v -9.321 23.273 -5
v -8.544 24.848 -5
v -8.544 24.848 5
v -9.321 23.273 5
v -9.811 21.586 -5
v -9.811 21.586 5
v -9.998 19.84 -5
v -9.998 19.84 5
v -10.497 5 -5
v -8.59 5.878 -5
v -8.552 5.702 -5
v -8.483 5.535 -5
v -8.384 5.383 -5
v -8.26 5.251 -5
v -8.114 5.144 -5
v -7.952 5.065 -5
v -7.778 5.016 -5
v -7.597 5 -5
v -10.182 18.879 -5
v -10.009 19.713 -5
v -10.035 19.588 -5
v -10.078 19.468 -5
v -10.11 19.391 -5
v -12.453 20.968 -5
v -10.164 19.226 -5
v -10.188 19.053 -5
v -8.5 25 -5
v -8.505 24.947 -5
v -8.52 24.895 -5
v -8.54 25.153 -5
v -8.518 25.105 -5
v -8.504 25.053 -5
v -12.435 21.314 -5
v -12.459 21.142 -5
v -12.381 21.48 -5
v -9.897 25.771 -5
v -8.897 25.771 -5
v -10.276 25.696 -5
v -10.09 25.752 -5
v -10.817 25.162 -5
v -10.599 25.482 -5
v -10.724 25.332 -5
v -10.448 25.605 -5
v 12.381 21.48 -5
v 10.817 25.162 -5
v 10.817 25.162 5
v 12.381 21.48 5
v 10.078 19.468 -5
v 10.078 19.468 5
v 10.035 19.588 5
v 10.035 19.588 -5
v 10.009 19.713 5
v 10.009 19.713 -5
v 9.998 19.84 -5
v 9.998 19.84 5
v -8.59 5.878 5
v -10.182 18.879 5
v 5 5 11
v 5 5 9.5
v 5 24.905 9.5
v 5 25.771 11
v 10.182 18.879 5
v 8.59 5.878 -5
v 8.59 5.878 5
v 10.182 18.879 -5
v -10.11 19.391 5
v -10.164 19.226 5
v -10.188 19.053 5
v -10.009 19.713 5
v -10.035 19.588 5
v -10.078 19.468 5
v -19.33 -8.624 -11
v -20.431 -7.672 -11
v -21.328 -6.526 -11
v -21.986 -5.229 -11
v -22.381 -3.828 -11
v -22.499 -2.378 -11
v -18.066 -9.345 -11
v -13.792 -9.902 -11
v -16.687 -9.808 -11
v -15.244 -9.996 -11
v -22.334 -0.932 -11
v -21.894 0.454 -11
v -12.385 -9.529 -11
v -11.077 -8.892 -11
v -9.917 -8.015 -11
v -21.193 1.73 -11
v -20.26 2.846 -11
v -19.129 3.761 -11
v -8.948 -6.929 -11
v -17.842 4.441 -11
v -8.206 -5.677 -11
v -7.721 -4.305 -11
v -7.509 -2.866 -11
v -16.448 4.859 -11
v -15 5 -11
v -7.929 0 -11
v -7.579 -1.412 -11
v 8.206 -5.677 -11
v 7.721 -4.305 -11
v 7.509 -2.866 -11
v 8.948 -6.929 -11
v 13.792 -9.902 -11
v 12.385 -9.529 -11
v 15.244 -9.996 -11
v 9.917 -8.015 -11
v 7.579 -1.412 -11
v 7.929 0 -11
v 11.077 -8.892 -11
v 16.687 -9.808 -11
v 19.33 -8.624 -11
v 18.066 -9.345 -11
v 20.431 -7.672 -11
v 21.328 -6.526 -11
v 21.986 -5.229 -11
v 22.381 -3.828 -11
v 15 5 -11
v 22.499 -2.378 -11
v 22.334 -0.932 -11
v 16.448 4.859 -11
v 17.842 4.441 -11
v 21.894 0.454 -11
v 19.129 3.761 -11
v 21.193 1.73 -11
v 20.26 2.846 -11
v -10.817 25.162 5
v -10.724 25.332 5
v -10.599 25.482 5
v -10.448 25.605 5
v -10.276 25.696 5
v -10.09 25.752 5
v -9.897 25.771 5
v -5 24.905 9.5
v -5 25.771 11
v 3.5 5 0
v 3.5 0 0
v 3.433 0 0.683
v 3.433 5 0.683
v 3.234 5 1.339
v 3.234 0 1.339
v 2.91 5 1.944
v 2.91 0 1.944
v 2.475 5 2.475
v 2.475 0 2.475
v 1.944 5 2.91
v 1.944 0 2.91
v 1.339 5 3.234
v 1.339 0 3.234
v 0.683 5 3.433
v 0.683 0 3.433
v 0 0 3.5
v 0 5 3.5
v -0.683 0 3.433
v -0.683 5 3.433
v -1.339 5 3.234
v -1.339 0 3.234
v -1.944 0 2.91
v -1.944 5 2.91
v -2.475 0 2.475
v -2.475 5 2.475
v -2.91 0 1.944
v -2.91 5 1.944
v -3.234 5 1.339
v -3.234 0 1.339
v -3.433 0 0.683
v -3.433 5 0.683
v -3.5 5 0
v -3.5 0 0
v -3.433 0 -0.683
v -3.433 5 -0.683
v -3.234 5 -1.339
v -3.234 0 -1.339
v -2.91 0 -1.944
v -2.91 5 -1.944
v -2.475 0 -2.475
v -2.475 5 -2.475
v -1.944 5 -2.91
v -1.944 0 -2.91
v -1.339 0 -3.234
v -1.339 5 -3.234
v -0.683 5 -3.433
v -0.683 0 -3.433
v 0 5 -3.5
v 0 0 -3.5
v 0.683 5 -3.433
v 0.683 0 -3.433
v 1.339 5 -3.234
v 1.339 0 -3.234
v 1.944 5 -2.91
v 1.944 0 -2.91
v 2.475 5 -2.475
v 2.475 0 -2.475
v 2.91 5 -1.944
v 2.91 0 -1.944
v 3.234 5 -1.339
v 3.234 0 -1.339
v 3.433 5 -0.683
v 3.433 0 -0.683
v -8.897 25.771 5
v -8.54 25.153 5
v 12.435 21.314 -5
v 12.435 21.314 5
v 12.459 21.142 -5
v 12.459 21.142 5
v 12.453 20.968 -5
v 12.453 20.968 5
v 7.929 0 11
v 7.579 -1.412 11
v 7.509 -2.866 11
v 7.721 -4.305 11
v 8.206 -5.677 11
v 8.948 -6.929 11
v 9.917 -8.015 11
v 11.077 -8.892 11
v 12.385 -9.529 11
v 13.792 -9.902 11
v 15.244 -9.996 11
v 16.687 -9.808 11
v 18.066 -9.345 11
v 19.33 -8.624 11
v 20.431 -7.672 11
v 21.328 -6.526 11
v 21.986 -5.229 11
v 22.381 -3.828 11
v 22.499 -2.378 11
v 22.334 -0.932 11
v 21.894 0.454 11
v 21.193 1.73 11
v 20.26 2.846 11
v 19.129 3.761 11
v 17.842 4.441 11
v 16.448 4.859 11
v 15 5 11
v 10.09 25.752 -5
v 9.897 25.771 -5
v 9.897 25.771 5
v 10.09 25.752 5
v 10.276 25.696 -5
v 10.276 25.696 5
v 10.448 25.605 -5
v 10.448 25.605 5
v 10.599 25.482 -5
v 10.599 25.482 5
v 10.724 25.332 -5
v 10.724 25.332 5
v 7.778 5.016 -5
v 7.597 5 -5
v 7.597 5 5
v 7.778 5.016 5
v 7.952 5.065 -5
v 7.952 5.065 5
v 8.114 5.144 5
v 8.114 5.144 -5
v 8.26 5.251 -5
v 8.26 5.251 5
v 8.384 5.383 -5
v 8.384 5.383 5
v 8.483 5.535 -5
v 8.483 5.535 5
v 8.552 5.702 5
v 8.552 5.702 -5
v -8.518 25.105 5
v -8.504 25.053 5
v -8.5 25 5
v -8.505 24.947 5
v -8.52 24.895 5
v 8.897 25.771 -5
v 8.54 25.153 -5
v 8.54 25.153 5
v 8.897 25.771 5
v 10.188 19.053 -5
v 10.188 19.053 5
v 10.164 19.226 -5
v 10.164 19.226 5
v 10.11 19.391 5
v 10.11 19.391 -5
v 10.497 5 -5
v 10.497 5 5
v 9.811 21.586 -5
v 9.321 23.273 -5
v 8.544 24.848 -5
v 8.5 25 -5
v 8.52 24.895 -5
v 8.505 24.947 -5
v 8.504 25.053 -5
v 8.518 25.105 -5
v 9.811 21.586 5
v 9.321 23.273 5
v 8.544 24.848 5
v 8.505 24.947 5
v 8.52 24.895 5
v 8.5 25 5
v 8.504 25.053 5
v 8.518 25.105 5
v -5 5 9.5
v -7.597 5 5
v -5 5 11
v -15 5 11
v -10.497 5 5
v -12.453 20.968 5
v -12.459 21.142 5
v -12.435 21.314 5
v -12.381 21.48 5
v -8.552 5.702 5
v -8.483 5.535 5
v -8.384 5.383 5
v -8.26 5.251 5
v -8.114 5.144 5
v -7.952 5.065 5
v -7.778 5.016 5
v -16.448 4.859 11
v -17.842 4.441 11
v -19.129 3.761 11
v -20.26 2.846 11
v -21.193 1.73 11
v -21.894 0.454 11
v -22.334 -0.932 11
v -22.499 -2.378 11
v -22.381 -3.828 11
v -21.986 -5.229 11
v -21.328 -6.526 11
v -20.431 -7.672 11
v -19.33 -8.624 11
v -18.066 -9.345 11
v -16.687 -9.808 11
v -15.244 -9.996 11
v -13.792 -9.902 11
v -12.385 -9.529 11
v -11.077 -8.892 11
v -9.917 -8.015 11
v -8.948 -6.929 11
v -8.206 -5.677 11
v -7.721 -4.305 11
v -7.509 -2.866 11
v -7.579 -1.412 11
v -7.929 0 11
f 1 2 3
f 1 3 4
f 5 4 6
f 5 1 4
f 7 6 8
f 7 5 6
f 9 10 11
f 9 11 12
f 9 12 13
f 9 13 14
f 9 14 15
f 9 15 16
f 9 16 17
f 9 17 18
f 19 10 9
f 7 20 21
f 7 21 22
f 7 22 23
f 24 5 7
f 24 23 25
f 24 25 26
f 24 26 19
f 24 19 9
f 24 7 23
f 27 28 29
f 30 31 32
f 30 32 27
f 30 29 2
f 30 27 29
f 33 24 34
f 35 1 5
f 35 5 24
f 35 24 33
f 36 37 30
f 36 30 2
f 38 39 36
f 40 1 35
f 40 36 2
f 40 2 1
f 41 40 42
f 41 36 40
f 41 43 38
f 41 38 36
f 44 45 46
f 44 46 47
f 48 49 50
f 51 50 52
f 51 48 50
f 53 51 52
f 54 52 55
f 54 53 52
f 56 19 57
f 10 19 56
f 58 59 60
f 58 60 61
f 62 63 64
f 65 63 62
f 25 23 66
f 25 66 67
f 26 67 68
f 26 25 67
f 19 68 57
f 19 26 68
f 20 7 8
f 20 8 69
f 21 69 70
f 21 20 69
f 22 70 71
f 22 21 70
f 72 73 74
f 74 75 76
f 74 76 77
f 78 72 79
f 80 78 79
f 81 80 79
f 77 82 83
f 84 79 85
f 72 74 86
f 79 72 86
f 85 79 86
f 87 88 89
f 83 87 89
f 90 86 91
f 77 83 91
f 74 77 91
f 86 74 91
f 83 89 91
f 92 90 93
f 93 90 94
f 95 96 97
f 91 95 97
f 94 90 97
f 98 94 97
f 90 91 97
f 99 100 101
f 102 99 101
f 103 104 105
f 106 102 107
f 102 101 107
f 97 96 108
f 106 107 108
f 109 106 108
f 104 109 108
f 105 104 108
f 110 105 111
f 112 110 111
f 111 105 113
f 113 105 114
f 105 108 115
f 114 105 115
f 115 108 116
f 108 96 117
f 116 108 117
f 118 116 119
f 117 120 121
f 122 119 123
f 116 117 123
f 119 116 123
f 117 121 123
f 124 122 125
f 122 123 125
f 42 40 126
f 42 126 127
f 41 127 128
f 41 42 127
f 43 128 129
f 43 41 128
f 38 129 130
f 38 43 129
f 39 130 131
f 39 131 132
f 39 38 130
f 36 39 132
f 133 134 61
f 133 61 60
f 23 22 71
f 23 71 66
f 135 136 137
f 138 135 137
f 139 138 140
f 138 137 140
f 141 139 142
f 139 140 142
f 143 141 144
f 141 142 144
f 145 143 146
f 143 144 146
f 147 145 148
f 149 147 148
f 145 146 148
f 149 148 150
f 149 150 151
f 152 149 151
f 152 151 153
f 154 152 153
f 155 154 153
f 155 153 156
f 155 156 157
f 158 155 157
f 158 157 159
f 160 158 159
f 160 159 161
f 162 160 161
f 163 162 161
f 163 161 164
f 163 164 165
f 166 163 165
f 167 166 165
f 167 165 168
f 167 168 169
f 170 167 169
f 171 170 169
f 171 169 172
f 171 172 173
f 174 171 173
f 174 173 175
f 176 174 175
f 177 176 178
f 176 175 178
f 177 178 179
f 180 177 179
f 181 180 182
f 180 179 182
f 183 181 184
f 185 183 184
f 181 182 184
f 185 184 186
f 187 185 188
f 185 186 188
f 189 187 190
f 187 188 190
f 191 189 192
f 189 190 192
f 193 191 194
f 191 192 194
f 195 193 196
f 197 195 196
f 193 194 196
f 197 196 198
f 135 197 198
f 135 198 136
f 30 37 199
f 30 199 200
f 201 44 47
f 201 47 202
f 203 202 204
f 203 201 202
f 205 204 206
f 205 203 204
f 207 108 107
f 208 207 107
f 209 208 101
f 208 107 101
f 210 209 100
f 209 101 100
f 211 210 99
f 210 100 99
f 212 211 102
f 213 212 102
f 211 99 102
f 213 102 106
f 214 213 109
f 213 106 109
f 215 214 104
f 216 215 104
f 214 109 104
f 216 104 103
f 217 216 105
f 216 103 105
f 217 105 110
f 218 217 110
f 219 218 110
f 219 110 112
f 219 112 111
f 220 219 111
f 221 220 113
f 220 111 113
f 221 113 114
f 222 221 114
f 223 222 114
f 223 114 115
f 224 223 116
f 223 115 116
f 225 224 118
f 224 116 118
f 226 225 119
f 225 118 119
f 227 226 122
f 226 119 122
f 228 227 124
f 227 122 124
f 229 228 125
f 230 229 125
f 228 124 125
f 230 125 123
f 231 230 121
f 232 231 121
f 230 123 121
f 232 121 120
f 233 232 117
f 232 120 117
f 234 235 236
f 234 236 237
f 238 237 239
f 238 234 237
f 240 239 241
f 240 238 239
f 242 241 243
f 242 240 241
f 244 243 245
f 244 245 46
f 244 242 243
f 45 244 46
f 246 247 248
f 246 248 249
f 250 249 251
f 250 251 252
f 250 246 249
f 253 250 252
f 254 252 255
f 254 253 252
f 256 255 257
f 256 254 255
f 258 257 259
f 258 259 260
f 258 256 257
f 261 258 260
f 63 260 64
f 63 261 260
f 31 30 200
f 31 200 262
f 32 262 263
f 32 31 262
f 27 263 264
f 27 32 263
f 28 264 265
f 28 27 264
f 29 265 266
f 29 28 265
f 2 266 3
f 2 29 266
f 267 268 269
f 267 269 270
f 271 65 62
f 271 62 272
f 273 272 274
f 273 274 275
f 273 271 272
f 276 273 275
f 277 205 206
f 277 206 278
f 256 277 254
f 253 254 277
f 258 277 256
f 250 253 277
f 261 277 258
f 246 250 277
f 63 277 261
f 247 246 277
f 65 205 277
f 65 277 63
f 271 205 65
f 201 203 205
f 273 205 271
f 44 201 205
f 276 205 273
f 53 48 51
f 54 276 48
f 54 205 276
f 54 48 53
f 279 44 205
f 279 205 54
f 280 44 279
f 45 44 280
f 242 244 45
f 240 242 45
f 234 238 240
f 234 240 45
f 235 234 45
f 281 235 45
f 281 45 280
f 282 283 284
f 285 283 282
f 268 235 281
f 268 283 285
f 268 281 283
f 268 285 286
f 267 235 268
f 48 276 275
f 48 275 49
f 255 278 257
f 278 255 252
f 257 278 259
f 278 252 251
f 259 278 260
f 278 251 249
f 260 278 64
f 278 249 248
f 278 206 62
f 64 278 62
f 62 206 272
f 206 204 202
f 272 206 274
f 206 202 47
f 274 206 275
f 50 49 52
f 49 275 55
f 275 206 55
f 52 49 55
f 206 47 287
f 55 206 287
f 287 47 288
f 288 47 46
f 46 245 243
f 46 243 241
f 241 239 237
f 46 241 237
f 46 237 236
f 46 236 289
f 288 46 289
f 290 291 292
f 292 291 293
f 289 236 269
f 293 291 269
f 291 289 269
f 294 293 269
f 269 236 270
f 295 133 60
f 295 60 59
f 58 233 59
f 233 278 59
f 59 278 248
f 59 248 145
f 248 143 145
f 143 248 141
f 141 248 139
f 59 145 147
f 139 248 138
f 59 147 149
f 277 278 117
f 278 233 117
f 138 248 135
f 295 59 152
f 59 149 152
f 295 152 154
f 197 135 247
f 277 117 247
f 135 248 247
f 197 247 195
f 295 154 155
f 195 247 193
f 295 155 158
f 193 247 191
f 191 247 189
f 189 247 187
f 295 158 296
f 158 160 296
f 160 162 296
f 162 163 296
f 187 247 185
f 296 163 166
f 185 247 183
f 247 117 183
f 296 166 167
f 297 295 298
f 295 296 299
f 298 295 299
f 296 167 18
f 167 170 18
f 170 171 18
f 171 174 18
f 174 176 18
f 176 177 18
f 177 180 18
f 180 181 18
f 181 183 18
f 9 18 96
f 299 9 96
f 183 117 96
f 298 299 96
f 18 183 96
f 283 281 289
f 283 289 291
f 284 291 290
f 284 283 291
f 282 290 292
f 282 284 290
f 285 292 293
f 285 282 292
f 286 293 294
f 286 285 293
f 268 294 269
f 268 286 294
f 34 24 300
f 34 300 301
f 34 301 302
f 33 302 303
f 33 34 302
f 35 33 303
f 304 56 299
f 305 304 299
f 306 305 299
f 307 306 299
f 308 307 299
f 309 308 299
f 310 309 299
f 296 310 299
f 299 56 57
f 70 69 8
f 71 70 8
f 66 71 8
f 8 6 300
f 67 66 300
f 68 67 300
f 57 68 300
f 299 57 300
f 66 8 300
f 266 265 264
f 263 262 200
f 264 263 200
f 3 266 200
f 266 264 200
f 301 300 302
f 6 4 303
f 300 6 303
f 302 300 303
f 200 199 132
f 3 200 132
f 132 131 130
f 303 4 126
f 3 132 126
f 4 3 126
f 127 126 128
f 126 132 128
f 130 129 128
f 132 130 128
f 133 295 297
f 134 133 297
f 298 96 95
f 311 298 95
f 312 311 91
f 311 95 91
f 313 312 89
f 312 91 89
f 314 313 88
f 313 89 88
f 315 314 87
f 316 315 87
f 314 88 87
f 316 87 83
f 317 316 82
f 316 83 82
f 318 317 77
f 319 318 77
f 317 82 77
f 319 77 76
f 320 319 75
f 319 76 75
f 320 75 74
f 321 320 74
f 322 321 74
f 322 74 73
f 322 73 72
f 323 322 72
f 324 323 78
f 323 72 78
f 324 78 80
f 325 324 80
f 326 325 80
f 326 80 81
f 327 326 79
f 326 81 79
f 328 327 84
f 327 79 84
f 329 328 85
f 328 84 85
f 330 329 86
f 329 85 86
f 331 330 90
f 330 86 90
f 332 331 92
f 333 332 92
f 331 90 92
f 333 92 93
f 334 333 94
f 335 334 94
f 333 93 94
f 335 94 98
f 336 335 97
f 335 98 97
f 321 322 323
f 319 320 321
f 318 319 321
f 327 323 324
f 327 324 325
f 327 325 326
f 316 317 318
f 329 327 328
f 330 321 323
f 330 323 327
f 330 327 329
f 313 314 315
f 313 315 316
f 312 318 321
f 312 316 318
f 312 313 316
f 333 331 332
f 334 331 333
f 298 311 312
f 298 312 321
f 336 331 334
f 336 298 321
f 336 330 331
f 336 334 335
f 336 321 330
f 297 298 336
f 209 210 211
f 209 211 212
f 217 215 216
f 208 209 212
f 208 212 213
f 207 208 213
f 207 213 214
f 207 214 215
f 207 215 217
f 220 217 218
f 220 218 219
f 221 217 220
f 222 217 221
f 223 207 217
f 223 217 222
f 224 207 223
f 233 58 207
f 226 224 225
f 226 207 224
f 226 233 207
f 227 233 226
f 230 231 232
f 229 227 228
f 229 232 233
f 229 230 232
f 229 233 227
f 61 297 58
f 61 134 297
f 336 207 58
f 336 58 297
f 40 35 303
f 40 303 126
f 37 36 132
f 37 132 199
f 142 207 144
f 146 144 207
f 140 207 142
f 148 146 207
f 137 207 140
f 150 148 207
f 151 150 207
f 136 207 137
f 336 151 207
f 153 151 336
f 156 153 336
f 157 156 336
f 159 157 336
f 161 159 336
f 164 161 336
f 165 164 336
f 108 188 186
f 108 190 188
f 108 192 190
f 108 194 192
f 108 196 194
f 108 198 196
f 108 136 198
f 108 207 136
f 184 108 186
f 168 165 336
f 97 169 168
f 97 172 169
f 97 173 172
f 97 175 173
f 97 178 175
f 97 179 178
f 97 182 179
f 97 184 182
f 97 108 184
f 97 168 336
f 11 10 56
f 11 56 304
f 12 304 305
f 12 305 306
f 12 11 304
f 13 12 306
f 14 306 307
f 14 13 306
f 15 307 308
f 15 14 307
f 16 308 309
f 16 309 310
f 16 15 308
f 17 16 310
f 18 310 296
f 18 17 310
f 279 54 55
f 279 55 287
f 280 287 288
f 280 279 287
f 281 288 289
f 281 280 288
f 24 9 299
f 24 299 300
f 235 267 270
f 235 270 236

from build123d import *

# Parameters (mm, degrees)
EXTRUDE_1582_DEPTH      = 11
EXTRUDE_1582_DEPTH_BACK = 11
EXTRUDE_2052_DEPTH      = 5
EXTRUDE_2052_DEPTH_BACK = 5
EXTRUDE_2225_DEPTH      = 5
EXTRUDE_2225_DEPTH_BACK = 5
CUT_EXTRUDE_2419_REACH  = 32.666
SKETCH_4_R              = 3.5
EXTRUDE_5_DEPTH         = 22


with BuildPart() as part:
    # Эскиз1 → Extrude 1582 (new, two sides: drawn at the far end of the back side and taken through both)
    with BuildSketch(Plane.XY.offset(-EXTRUDE_1582_DEPTH_BACK)):
        with BuildLine():
            Line((9, 0), (-9, 0))
            ThreePointArc((-9, 0), (-9.662499048, 0.250937245), (-9.992506725, 0.877809978))
            Line((-9.992506725, 0.877809978), (-10.5, 5))
            Line((-10.5, 5), (10.5, 5))
            Line((10.5, 5), (9.992506725, 0.877809978))
            ThreePointArc((9.992506725, 0.877809978), (9.662499048, 0.250937245), (9, 0))
        make_face()
    extrude(amount=EXTRUDE_1582_DEPTH + EXTRUDE_1582_DEPTH_BACK)

    # Эскиз6 → Extrude 2052 (add, two sides: drawn at the far end of the back side and taken through both)
    with BuildSketch(Plane.XY.offset(-EXTRUDE_2052_DEPTH_BACK)):
        with BuildLine():
            Line((9.000000194, 0), (-9.000000194, 0))
            ThreePointArc((-9.000000194, 0), (-9.662731652, 0.251142861), (-9.992582561, 0.87842597))
            Line((-9.992582561, 0.87842597), (-12.453151595, 20.967563779))
            ThreePointArc((-12.453151595, 20.967563779), (-12.450795845, 21.228605534), (-12.380957788, 21.480142794))
            Line((-12.380957788, 21.480142794), (-10.816937846, 25.161697034))
            ThreePointArc((-10.816937846, 25.161697034), (-10.448362214, 25.604659969), (-9.896549286, 25.770692048))
            Line((-9.896549286, 25.770692048), (-8.896549286, 25.770692048))
            Line((-8.896549286, 25.770692048), (-8.540172772, 25.153429819))
            ThreePointArc((-8.540172772, 25.153429819), (-8.5, 25), (-8.543670285, 24.847528799))
            ThreePointArc((-8.543670285, 24.847528799), (-9.603061276, 22.440310879), (-9.99820781, 19.840144231))
            ThreePointArc((-9.99820781, 19.840144231), (-10.020066103, 19.650295162), (-10.077640031, 19.468070858))
            Line((-10.077640031, 19.468070858), (-10.11018486, 19.391463424))
            ThreePointArc((-10.11018486, 19.391463424), (-10.180022917, 19.139926164), (-10.182378667, 18.878884409))
            Line((-10.182378667, 18.878884409), (-8.590049232, 5.87842597))
            ThreePointArc((-8.590049232, 5.87842597), (-8.260198323, 5.251142861), (-7.597466865, 5))
            Line((-7.597466865, 5), (7.597466865, 5))
            ThreePointArc((7.597466865, 5), (8.260198323, 5.251142861), (8.590049232, 5.87842597))
            Line((8.590049232, 5.87842597), (10.182378667, 18.878884409))
            ThreePointArc((10.182378667, 18.878884409), (10.180022917, 19.139926164), (10.11018486, 19.391463424))
            Line((10.11018486, 19.391463424), (10.077640031, 19.468070858))
            ThreePointArc((10.077640031, 19.468070858), (10.020066103, 19.650295162), (9.99820781, 19.840144231))
            ThreePointArc((9.99820781, 19.840144231), (9.603061276, 22.440310879), (8.543670285, 24.847528799))
            ThreePointArc((8.543670285, 24.847528799), (8.5, 25), (8.540172772, 25.153429819))
            Line((8.540172772, 25.153429819), (8.896549286, 25.770692048))
            Line((8.896549286, 25.770692048), (9.896549286, 25.770692048))
            ThreePointArc((9.896549286, 25.770692048), (10.448362214, 25.604659969), (10.816937846, 25.161697034))
            Line((10.816937846, 25.161697034), (12.380957788, 21.480142794))
            ThreePointArc((12.380957788, 21.480142794), (12.450795845, 21.228605534), (12.453151595, 20.967563779))
            Line((12.453151595, 20.967563779), (9.992582561, 0.87842597))
            ThreePointArc((9.992582561, 0.87842597), (9.662731652, 0.251142861), (9.000000194, 0))
        make_face()
    extrude(amount=EXTRUDE_2052_DEPTH + EXTRUDE_2052_DEPTH_BACK)

    # Эскиз3 → Extrude 2225 (add, two sides: drawn at the far end of the back side and taken through both)
    with BuildSketch(Plane(origin=(0, 0, 0), x_dir=(0, 0, -1), z_dir=(1, 0, 0)).offset(-EXTRUDE_2225_DEPTH_BACK)):
        Polygon((-9.5, 5), (-11, 5), (-11, 25.770692048), (-9.5, 24.904666645), align=None)
    extrude(amount=EXTRUDE_2225_DEPTH + EXTRUDE_2225_DEPTH_BACK)

    # Эскиз4 → Cut-Extrude 2419 (cut, up to next)
    with BuildSketch(Plane.XZ, mode=Mode.PRIVATE) as cut_extrude_2419_sk1:
        Circle(SKETCH_4_R)
    cut_extrude_2419_tool1 = extrude(cut_extrude_2419_sk1.sketch, amount=-CUT_EXTRUDE_2419_REACH, mode=Mode.PRIVATE) & part.part
    add(cut_extrude_2419_tool1.solids().sort_by_distance((0, 0, 0))[0], mode=Mode.SUBTRACT)

    # Эскиз7 → Бобышка-Вытянуть5 (add)
    with BuildSketch(Plane(origin=(0, 0, -11), x_dir=(-1, 0, 0), z_dir=(0, 0, -1))):
        with BuildLine():
            Line((7.928932188, 0), (9, 0))
            ThreePointArc((9, 0), (9.662499048, 0.250937245), (9.992506725, 0.877809978))
            Line((9.992506725, 0.877809978), (10.5, 5))
            Line((10.5, 5), (15, 5))
            ThreePointArc((15, 5), (19.330127019, -8.623724357), (7.928932188, 0))
        make_face()
        with BuildLine():
            Line((-15, 5), (-10.5, 5))
            Line((-10.5, 5), (-9.992506725, 0.877809978))
            ThreePointArc((-9.992506725, 0.877809978), (-9.662499048, 0.250937245), (-9, 0))
            Line((-9, 0), (-7.928932188, 0))
            ThreePointArc((-7.928932188, 0), (-19.330127019, -8.623724357), (-15, 5))
        make_face()
    extrude(amount=-EXTRUDE_5_DEPTH)


solid = part.part
